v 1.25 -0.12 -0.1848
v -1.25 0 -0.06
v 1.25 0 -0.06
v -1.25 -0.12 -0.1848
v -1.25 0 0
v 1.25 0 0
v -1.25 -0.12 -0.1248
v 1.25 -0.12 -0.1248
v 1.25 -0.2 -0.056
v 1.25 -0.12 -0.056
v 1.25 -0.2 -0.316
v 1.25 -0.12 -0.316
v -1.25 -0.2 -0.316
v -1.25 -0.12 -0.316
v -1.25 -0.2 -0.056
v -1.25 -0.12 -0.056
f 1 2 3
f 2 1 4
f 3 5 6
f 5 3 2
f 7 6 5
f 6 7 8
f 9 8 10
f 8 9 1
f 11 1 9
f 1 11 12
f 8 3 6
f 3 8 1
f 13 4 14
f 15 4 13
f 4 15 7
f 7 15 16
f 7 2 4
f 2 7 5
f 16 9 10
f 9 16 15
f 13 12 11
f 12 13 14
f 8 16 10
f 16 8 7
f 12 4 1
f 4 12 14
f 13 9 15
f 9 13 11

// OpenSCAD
// Tent shell kit: eave. See lib/lodge_kit.scad.
include <lib/lodge_kit.scad>
kind = "tent";
eave();
